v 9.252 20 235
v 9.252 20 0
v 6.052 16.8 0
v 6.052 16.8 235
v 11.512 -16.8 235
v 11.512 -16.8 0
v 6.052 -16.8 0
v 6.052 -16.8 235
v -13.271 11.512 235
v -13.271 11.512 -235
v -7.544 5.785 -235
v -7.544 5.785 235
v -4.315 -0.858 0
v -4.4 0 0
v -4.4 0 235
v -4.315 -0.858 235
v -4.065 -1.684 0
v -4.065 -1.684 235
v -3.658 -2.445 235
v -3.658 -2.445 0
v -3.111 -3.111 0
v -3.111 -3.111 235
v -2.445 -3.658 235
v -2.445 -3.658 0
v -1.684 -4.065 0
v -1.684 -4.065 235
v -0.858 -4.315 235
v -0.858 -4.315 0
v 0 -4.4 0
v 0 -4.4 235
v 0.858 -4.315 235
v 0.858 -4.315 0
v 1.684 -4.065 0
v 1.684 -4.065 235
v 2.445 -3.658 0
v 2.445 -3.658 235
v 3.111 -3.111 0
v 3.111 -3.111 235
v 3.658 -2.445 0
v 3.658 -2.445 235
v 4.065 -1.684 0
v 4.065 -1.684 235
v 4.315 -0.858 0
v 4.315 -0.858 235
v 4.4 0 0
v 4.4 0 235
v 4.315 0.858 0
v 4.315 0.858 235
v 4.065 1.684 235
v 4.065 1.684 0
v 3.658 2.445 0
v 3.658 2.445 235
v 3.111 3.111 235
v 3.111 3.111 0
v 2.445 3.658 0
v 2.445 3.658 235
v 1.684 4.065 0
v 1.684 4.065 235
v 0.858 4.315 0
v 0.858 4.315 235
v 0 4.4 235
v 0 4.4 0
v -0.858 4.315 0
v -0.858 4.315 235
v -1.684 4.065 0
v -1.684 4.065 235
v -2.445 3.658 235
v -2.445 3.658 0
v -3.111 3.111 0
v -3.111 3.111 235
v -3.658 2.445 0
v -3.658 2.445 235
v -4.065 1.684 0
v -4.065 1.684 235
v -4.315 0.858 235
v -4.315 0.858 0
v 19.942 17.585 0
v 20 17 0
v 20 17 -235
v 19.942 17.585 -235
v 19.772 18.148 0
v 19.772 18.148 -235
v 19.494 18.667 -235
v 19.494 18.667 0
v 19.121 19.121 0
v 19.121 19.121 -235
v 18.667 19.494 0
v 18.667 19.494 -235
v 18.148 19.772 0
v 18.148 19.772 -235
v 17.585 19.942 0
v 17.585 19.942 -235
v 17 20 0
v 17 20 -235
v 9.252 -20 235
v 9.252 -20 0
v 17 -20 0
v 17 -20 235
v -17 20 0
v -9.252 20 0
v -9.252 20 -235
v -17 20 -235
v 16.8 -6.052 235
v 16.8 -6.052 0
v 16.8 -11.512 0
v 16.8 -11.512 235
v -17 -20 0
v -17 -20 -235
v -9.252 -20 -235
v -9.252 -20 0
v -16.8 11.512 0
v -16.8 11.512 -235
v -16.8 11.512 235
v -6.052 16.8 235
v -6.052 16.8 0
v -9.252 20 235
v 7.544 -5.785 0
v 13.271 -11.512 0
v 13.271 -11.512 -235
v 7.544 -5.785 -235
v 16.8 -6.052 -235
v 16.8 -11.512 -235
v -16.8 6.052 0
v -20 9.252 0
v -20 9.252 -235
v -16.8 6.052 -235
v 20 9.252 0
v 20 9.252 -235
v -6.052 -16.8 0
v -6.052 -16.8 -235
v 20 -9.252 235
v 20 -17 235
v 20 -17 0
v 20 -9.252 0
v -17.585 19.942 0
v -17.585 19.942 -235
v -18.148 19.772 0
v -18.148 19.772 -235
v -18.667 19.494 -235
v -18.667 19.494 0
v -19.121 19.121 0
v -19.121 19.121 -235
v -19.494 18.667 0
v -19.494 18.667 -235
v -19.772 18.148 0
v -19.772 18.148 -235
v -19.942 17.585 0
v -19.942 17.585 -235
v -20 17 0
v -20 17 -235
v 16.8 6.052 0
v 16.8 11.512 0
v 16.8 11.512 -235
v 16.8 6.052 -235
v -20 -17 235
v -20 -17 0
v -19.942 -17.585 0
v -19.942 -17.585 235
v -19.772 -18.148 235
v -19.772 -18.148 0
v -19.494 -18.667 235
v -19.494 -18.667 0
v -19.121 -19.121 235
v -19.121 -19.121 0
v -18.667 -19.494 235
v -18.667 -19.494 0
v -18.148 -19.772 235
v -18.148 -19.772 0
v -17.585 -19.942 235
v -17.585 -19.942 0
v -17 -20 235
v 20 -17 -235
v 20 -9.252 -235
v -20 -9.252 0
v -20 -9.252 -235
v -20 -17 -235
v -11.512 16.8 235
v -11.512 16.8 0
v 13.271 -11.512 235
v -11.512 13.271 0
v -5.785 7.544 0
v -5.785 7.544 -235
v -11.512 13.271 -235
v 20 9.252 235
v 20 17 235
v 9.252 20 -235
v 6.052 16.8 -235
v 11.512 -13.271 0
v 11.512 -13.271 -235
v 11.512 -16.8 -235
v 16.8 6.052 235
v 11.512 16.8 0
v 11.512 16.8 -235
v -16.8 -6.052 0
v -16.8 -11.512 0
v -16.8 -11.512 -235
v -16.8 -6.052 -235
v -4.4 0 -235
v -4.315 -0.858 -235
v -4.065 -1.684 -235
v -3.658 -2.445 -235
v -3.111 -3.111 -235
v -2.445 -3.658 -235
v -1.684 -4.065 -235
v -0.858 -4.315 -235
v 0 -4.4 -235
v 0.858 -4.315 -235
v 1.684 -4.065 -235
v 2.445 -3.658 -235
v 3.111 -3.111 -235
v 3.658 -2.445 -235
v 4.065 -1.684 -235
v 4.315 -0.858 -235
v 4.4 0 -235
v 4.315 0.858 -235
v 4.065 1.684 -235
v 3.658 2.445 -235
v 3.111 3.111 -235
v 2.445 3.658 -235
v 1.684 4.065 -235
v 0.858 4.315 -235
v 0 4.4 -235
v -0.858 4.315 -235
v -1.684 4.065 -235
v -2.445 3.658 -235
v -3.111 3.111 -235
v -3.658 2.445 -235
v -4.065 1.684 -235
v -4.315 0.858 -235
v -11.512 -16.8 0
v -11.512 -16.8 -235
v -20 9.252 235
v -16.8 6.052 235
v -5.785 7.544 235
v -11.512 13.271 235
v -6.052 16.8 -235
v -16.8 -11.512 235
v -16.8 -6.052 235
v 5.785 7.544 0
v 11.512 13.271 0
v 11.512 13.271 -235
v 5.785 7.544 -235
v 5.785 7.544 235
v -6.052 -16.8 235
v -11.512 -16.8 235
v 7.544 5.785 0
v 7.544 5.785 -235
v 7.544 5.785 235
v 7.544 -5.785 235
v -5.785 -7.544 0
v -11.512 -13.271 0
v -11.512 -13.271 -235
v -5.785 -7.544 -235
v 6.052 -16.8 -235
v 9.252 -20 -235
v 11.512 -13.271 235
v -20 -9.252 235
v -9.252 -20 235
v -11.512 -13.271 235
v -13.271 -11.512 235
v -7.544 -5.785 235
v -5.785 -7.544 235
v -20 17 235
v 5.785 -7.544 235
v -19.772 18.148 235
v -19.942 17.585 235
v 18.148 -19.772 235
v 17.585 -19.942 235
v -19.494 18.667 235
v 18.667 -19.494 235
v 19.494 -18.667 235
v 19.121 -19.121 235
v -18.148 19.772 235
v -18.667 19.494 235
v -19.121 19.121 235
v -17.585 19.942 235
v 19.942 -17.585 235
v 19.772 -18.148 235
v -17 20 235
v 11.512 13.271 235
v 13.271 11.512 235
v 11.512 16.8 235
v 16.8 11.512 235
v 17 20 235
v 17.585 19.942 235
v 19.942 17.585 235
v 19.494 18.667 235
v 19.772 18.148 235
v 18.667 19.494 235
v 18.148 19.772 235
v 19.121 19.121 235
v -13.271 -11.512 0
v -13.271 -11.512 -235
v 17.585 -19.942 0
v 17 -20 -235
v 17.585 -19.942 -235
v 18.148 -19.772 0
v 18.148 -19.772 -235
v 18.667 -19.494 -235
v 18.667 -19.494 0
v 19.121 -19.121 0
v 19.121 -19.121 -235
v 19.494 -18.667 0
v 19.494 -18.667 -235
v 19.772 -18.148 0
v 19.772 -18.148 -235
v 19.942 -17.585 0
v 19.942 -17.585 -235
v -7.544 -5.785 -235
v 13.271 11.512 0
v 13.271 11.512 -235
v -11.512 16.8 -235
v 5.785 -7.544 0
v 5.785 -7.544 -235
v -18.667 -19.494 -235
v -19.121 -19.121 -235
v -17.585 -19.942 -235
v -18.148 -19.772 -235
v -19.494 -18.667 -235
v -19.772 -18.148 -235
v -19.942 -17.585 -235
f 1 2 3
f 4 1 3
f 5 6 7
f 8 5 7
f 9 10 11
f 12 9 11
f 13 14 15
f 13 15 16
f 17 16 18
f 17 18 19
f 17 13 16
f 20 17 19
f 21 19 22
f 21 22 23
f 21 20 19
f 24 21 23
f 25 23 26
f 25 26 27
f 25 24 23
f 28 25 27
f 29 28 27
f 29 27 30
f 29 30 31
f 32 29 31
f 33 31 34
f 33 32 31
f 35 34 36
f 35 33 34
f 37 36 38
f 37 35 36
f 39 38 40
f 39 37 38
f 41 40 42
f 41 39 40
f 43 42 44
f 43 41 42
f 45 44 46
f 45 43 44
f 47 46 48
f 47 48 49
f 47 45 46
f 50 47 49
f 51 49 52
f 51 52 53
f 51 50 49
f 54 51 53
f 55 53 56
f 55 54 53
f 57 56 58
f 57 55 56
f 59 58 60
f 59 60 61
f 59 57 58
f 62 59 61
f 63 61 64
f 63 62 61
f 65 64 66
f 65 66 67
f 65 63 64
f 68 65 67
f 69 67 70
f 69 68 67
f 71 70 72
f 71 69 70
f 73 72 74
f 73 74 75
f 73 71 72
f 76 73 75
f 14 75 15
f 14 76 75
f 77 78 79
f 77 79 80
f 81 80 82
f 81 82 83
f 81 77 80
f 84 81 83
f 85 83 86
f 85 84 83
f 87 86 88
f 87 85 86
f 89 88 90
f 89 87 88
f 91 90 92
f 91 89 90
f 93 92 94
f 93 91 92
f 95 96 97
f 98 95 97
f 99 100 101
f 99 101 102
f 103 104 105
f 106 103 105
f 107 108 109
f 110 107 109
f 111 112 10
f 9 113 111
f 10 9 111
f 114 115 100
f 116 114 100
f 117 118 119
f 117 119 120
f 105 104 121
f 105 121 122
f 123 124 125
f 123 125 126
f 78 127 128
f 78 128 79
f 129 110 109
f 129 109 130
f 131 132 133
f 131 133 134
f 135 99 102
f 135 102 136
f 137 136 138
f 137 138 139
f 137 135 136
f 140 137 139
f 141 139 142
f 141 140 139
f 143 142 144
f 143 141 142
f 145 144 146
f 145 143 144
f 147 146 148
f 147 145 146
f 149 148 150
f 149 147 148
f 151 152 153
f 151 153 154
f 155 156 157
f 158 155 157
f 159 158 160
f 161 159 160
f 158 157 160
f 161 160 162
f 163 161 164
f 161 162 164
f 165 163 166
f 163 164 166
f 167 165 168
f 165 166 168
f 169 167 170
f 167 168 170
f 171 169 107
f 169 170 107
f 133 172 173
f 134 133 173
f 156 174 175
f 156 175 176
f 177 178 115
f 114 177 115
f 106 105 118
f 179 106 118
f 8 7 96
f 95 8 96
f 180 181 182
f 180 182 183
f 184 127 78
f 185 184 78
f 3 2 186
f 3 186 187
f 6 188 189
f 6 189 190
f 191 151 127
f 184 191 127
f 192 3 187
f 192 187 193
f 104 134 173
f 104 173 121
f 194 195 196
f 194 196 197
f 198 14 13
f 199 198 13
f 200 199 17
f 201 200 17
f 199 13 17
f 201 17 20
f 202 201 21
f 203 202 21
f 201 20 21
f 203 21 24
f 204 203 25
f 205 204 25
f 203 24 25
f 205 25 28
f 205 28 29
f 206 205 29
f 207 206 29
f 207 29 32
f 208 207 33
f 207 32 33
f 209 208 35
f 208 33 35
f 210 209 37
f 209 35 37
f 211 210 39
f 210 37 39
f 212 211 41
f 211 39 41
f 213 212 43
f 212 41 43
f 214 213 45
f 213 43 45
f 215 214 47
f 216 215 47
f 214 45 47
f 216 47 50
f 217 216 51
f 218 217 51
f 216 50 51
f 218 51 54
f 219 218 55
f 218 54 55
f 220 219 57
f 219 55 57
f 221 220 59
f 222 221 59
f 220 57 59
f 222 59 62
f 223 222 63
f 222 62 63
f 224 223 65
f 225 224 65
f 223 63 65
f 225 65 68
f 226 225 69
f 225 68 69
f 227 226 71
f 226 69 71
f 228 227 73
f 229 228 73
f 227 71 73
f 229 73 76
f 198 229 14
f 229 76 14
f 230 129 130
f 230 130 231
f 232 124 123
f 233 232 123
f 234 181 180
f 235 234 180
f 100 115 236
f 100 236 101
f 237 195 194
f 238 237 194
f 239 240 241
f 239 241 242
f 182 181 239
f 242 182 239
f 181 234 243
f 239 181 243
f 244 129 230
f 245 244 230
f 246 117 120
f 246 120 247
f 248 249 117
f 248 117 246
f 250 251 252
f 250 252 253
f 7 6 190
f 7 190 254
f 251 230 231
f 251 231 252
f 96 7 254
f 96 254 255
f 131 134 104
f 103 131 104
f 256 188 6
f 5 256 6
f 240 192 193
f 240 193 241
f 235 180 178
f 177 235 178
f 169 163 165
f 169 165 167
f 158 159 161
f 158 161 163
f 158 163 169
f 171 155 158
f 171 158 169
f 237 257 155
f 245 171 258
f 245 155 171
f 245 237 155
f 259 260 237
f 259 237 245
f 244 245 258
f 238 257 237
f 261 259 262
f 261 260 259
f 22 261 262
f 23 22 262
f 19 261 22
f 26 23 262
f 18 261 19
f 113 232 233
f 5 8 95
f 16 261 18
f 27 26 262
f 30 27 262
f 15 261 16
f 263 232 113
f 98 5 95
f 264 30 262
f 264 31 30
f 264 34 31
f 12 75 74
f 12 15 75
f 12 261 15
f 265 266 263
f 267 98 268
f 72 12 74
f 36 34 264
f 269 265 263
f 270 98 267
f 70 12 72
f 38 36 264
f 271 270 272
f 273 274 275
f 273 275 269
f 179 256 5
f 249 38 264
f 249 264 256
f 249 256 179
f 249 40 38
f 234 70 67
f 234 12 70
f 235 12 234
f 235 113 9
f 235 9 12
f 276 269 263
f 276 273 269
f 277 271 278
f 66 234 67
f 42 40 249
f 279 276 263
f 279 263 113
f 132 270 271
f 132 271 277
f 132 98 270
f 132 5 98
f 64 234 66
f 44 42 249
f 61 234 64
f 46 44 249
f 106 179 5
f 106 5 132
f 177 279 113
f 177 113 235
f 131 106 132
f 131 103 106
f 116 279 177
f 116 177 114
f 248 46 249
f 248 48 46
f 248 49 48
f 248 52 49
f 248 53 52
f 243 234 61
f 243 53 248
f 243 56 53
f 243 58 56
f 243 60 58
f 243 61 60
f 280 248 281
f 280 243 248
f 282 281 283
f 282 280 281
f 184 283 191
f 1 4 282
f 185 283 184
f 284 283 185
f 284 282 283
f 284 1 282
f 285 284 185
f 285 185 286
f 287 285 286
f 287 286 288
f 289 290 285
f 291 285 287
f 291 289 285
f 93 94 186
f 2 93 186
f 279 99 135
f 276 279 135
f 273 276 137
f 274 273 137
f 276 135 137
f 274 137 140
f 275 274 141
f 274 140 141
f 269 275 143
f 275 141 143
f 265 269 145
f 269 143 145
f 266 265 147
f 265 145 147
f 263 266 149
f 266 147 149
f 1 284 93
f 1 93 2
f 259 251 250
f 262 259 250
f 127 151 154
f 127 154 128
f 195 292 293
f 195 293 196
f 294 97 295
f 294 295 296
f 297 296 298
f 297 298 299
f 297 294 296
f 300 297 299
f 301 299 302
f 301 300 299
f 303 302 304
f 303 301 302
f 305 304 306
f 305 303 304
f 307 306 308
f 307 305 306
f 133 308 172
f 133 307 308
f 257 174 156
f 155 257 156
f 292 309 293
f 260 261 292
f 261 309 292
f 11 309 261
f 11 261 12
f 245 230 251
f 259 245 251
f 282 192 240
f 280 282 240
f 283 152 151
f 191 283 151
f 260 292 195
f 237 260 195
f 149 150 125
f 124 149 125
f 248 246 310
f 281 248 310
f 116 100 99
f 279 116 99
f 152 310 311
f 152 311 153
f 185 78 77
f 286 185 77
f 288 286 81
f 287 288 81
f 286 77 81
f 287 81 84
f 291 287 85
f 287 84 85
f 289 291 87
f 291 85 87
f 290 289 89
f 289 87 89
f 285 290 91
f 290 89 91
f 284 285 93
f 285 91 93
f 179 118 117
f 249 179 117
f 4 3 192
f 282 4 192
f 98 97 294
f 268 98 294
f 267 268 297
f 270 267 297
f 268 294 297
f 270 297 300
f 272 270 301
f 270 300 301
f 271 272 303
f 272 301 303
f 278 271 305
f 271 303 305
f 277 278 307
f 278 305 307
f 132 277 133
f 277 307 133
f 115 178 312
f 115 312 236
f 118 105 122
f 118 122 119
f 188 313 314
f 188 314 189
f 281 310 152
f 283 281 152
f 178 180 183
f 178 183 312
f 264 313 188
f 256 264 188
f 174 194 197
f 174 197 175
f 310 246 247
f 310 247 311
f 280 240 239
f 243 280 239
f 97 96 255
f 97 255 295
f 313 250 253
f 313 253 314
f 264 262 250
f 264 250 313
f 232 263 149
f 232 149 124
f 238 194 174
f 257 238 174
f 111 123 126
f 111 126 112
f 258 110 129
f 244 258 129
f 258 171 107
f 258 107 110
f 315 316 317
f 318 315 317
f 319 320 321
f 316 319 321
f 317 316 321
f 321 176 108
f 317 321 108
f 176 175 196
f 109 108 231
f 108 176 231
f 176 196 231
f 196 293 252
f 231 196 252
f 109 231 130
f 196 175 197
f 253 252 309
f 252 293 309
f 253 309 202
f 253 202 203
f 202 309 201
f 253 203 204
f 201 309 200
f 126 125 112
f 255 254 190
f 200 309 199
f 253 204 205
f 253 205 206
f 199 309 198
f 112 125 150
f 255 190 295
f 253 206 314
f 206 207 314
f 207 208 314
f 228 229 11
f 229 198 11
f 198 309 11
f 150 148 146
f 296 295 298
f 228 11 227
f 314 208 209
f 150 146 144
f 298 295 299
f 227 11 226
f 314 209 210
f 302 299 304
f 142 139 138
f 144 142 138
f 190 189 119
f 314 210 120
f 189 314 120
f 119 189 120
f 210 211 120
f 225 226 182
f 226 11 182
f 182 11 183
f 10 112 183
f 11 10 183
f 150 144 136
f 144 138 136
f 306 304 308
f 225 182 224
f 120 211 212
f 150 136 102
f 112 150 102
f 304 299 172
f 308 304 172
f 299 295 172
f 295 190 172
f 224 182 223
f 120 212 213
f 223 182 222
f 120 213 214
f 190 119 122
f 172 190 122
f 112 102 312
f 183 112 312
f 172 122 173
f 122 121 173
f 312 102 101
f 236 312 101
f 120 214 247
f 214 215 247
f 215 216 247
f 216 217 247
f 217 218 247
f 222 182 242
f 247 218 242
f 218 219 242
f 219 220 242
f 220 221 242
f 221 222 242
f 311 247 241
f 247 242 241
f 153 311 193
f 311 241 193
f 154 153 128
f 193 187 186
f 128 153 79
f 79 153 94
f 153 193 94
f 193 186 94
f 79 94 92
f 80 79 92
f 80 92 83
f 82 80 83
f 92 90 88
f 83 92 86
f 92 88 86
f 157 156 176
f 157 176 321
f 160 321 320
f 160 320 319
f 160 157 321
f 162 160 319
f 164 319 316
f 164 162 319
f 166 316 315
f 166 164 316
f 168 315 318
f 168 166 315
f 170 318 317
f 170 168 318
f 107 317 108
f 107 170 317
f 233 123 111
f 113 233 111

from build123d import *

# Parameters (mm, degrees)
SKETCH1_W           = 15.088
SKETCH1_H           = 15.088
SKETCH1_R           = 4.4
BOSS_EXTRUDE1_DEPTH = 235


with BuildPart() as part:
    # Sketch1 → Boss-Extrude1 (new, symmetric)
    # profile 1 of 5: a face of its own
    with BuildSketch(Plane.XY):
        with BuildLine():
            Line((-7.544, 7.544), (-5.784718328, 7.544))
            Line((-5.784718328, 7.544), (-11.512, 13.271281672))
            Line((-11.512, 13.271281672), (-11.512, 16.8))
            Line((-11.512, 16.8), (-6.051976926, 16.8))
            Line((-6.051976926, 16.8), (-9.251976926, 20))
            Line((-9.251976926, 20), (-17, 20))
            ThreePointArc((-17, 20), (-19.121320344, 19.121320344), (-20, 17))
            Line((-20, 17), (-20, 9.251976926))
            Line((-20, 9.251976926), (-16.8, 6.051976926))
            Line((-16.8, 6.051976926), (-16.8, 11.512))
            Line((-16.8, 11.512), (-13.271281672, 11.512))
            Line((-13.271281672, 11.512), (-7.544, 5.784718328))
            Line((-7.544, 5.784718328), (-7.544, 7.544))
        make_face()
    # profile 2 of 5: a face of its own
    with BuildSketch(Plane.XY):
        with BuildLine():
            Line((11.512, 13.271281672), (5.784718328, 7.544))
            Line((5.784718328, 7.544), (7.544, 7.544))
            Line((7.544, 7.544), (7.544, 5.784718328))
            Line((7.544, 5.784718328), (13.271281672, 11.512))
            Line((13.271281672, 11.512), (16.8, 11.512))
            Line((16.8, 11.512), (16.8, 6.051976926))
            Line((16.8, 6.051976926), (20, 9.251976926))
            Line((20, 9.251976926), (20, 17))
            ThreePointArc((20, 17), (19.121320344, 19.121320344), (17, 20))
            Line((17, 20), (9.251976926, 20))
            Line((9.251976926, 20), (6.051976926, 16.8))
            Line((6.051976926, 16.8), (11.512, 16.8))
            Line((11.512, 16.8), (11.512, 13.271281672))
        make_face()
    # profile 3 of 5: a face of its own
    with BuildSketch(Plane.XY):
        with BuildLine():
            Line((-7.544, -7.544), (-7.544, -5.784718328))
            Line((-7.544, -5.784718328), (-13.271281672, -11.512))
            Line((-13.271281672, -11.512), (-16.8, -11.512))
            Line((-16.8, -11.512), (-16.8, -6.051976926))
            Line((-16.8, -6.051976926), (-20, -9.251976926))
            Line((-20, -9.251976926), (-20, -17))
            ThreePointArc((-20, -17), (-19.121320344, -19.121320344), (-17, -20))
            Line((-17, -20), (-9.251976926, -20))
            Line((-9.251976926, -20), (-6.051976926, -16.8))
            Line((-6.051976926, -16.8), (-11.512, -16.8))
            Line((-11.512, -16.8), (-11.512, -13.271281672))
            Line((-11.512, -13.271281672), (-5.784718328, -7.544))
            Line((-5.784718328, -7.544), (-7.544, -7.544))
        make_face()
    # profile 4 of 5: a face of its own
    with BuildSketch(Plane.XY):
        with BuildLine():
            Line((13.271281672, -11.512), (7.544, -5.784718328))
            Line((7.544, -5.784718328), (7.544, -7.544))
            Line((7.544, -7.544), (5.784718328, -7.544))
            Line((5.784718328, -7.544), (11.512, -13.271281672))
            Line((11.512, -13.271281672), (11.512, -16.8))
            Line((11.512, -16.8), (6.051976926, -16.8))
            Line((6.051976926, -16.8), (9.251976926, -20))
            Line((9.251976926, -20), (17, -20))
            ThreePointArc((17, -20), (19.121320344, -19.121320344), (20, -17))
            Line((20, -17), (20, -9.251976926))
            Line((20, -9.251976926), (16.8, -6.051976926))
            Line((16.8, -6.051976926), (16.8, -11.512))
            Line((16.8, -11.512), (13.271281672, -11.512))
        make_face()
    # profile 5 of 5: a face of its own
    with BuildSketch(Plane.XY):
        Rectangle(SKETCH1_W, SKETCH1_H)
        with Locations(Location((0, 0, 0), (0, 0, 180))):
            Circle(SKETCH1_R, mode=Mode.SUBTRACT)
    extrude(amount=BOSS_EXTRUDE1_DEPTH, both=True)


solid = part.part
